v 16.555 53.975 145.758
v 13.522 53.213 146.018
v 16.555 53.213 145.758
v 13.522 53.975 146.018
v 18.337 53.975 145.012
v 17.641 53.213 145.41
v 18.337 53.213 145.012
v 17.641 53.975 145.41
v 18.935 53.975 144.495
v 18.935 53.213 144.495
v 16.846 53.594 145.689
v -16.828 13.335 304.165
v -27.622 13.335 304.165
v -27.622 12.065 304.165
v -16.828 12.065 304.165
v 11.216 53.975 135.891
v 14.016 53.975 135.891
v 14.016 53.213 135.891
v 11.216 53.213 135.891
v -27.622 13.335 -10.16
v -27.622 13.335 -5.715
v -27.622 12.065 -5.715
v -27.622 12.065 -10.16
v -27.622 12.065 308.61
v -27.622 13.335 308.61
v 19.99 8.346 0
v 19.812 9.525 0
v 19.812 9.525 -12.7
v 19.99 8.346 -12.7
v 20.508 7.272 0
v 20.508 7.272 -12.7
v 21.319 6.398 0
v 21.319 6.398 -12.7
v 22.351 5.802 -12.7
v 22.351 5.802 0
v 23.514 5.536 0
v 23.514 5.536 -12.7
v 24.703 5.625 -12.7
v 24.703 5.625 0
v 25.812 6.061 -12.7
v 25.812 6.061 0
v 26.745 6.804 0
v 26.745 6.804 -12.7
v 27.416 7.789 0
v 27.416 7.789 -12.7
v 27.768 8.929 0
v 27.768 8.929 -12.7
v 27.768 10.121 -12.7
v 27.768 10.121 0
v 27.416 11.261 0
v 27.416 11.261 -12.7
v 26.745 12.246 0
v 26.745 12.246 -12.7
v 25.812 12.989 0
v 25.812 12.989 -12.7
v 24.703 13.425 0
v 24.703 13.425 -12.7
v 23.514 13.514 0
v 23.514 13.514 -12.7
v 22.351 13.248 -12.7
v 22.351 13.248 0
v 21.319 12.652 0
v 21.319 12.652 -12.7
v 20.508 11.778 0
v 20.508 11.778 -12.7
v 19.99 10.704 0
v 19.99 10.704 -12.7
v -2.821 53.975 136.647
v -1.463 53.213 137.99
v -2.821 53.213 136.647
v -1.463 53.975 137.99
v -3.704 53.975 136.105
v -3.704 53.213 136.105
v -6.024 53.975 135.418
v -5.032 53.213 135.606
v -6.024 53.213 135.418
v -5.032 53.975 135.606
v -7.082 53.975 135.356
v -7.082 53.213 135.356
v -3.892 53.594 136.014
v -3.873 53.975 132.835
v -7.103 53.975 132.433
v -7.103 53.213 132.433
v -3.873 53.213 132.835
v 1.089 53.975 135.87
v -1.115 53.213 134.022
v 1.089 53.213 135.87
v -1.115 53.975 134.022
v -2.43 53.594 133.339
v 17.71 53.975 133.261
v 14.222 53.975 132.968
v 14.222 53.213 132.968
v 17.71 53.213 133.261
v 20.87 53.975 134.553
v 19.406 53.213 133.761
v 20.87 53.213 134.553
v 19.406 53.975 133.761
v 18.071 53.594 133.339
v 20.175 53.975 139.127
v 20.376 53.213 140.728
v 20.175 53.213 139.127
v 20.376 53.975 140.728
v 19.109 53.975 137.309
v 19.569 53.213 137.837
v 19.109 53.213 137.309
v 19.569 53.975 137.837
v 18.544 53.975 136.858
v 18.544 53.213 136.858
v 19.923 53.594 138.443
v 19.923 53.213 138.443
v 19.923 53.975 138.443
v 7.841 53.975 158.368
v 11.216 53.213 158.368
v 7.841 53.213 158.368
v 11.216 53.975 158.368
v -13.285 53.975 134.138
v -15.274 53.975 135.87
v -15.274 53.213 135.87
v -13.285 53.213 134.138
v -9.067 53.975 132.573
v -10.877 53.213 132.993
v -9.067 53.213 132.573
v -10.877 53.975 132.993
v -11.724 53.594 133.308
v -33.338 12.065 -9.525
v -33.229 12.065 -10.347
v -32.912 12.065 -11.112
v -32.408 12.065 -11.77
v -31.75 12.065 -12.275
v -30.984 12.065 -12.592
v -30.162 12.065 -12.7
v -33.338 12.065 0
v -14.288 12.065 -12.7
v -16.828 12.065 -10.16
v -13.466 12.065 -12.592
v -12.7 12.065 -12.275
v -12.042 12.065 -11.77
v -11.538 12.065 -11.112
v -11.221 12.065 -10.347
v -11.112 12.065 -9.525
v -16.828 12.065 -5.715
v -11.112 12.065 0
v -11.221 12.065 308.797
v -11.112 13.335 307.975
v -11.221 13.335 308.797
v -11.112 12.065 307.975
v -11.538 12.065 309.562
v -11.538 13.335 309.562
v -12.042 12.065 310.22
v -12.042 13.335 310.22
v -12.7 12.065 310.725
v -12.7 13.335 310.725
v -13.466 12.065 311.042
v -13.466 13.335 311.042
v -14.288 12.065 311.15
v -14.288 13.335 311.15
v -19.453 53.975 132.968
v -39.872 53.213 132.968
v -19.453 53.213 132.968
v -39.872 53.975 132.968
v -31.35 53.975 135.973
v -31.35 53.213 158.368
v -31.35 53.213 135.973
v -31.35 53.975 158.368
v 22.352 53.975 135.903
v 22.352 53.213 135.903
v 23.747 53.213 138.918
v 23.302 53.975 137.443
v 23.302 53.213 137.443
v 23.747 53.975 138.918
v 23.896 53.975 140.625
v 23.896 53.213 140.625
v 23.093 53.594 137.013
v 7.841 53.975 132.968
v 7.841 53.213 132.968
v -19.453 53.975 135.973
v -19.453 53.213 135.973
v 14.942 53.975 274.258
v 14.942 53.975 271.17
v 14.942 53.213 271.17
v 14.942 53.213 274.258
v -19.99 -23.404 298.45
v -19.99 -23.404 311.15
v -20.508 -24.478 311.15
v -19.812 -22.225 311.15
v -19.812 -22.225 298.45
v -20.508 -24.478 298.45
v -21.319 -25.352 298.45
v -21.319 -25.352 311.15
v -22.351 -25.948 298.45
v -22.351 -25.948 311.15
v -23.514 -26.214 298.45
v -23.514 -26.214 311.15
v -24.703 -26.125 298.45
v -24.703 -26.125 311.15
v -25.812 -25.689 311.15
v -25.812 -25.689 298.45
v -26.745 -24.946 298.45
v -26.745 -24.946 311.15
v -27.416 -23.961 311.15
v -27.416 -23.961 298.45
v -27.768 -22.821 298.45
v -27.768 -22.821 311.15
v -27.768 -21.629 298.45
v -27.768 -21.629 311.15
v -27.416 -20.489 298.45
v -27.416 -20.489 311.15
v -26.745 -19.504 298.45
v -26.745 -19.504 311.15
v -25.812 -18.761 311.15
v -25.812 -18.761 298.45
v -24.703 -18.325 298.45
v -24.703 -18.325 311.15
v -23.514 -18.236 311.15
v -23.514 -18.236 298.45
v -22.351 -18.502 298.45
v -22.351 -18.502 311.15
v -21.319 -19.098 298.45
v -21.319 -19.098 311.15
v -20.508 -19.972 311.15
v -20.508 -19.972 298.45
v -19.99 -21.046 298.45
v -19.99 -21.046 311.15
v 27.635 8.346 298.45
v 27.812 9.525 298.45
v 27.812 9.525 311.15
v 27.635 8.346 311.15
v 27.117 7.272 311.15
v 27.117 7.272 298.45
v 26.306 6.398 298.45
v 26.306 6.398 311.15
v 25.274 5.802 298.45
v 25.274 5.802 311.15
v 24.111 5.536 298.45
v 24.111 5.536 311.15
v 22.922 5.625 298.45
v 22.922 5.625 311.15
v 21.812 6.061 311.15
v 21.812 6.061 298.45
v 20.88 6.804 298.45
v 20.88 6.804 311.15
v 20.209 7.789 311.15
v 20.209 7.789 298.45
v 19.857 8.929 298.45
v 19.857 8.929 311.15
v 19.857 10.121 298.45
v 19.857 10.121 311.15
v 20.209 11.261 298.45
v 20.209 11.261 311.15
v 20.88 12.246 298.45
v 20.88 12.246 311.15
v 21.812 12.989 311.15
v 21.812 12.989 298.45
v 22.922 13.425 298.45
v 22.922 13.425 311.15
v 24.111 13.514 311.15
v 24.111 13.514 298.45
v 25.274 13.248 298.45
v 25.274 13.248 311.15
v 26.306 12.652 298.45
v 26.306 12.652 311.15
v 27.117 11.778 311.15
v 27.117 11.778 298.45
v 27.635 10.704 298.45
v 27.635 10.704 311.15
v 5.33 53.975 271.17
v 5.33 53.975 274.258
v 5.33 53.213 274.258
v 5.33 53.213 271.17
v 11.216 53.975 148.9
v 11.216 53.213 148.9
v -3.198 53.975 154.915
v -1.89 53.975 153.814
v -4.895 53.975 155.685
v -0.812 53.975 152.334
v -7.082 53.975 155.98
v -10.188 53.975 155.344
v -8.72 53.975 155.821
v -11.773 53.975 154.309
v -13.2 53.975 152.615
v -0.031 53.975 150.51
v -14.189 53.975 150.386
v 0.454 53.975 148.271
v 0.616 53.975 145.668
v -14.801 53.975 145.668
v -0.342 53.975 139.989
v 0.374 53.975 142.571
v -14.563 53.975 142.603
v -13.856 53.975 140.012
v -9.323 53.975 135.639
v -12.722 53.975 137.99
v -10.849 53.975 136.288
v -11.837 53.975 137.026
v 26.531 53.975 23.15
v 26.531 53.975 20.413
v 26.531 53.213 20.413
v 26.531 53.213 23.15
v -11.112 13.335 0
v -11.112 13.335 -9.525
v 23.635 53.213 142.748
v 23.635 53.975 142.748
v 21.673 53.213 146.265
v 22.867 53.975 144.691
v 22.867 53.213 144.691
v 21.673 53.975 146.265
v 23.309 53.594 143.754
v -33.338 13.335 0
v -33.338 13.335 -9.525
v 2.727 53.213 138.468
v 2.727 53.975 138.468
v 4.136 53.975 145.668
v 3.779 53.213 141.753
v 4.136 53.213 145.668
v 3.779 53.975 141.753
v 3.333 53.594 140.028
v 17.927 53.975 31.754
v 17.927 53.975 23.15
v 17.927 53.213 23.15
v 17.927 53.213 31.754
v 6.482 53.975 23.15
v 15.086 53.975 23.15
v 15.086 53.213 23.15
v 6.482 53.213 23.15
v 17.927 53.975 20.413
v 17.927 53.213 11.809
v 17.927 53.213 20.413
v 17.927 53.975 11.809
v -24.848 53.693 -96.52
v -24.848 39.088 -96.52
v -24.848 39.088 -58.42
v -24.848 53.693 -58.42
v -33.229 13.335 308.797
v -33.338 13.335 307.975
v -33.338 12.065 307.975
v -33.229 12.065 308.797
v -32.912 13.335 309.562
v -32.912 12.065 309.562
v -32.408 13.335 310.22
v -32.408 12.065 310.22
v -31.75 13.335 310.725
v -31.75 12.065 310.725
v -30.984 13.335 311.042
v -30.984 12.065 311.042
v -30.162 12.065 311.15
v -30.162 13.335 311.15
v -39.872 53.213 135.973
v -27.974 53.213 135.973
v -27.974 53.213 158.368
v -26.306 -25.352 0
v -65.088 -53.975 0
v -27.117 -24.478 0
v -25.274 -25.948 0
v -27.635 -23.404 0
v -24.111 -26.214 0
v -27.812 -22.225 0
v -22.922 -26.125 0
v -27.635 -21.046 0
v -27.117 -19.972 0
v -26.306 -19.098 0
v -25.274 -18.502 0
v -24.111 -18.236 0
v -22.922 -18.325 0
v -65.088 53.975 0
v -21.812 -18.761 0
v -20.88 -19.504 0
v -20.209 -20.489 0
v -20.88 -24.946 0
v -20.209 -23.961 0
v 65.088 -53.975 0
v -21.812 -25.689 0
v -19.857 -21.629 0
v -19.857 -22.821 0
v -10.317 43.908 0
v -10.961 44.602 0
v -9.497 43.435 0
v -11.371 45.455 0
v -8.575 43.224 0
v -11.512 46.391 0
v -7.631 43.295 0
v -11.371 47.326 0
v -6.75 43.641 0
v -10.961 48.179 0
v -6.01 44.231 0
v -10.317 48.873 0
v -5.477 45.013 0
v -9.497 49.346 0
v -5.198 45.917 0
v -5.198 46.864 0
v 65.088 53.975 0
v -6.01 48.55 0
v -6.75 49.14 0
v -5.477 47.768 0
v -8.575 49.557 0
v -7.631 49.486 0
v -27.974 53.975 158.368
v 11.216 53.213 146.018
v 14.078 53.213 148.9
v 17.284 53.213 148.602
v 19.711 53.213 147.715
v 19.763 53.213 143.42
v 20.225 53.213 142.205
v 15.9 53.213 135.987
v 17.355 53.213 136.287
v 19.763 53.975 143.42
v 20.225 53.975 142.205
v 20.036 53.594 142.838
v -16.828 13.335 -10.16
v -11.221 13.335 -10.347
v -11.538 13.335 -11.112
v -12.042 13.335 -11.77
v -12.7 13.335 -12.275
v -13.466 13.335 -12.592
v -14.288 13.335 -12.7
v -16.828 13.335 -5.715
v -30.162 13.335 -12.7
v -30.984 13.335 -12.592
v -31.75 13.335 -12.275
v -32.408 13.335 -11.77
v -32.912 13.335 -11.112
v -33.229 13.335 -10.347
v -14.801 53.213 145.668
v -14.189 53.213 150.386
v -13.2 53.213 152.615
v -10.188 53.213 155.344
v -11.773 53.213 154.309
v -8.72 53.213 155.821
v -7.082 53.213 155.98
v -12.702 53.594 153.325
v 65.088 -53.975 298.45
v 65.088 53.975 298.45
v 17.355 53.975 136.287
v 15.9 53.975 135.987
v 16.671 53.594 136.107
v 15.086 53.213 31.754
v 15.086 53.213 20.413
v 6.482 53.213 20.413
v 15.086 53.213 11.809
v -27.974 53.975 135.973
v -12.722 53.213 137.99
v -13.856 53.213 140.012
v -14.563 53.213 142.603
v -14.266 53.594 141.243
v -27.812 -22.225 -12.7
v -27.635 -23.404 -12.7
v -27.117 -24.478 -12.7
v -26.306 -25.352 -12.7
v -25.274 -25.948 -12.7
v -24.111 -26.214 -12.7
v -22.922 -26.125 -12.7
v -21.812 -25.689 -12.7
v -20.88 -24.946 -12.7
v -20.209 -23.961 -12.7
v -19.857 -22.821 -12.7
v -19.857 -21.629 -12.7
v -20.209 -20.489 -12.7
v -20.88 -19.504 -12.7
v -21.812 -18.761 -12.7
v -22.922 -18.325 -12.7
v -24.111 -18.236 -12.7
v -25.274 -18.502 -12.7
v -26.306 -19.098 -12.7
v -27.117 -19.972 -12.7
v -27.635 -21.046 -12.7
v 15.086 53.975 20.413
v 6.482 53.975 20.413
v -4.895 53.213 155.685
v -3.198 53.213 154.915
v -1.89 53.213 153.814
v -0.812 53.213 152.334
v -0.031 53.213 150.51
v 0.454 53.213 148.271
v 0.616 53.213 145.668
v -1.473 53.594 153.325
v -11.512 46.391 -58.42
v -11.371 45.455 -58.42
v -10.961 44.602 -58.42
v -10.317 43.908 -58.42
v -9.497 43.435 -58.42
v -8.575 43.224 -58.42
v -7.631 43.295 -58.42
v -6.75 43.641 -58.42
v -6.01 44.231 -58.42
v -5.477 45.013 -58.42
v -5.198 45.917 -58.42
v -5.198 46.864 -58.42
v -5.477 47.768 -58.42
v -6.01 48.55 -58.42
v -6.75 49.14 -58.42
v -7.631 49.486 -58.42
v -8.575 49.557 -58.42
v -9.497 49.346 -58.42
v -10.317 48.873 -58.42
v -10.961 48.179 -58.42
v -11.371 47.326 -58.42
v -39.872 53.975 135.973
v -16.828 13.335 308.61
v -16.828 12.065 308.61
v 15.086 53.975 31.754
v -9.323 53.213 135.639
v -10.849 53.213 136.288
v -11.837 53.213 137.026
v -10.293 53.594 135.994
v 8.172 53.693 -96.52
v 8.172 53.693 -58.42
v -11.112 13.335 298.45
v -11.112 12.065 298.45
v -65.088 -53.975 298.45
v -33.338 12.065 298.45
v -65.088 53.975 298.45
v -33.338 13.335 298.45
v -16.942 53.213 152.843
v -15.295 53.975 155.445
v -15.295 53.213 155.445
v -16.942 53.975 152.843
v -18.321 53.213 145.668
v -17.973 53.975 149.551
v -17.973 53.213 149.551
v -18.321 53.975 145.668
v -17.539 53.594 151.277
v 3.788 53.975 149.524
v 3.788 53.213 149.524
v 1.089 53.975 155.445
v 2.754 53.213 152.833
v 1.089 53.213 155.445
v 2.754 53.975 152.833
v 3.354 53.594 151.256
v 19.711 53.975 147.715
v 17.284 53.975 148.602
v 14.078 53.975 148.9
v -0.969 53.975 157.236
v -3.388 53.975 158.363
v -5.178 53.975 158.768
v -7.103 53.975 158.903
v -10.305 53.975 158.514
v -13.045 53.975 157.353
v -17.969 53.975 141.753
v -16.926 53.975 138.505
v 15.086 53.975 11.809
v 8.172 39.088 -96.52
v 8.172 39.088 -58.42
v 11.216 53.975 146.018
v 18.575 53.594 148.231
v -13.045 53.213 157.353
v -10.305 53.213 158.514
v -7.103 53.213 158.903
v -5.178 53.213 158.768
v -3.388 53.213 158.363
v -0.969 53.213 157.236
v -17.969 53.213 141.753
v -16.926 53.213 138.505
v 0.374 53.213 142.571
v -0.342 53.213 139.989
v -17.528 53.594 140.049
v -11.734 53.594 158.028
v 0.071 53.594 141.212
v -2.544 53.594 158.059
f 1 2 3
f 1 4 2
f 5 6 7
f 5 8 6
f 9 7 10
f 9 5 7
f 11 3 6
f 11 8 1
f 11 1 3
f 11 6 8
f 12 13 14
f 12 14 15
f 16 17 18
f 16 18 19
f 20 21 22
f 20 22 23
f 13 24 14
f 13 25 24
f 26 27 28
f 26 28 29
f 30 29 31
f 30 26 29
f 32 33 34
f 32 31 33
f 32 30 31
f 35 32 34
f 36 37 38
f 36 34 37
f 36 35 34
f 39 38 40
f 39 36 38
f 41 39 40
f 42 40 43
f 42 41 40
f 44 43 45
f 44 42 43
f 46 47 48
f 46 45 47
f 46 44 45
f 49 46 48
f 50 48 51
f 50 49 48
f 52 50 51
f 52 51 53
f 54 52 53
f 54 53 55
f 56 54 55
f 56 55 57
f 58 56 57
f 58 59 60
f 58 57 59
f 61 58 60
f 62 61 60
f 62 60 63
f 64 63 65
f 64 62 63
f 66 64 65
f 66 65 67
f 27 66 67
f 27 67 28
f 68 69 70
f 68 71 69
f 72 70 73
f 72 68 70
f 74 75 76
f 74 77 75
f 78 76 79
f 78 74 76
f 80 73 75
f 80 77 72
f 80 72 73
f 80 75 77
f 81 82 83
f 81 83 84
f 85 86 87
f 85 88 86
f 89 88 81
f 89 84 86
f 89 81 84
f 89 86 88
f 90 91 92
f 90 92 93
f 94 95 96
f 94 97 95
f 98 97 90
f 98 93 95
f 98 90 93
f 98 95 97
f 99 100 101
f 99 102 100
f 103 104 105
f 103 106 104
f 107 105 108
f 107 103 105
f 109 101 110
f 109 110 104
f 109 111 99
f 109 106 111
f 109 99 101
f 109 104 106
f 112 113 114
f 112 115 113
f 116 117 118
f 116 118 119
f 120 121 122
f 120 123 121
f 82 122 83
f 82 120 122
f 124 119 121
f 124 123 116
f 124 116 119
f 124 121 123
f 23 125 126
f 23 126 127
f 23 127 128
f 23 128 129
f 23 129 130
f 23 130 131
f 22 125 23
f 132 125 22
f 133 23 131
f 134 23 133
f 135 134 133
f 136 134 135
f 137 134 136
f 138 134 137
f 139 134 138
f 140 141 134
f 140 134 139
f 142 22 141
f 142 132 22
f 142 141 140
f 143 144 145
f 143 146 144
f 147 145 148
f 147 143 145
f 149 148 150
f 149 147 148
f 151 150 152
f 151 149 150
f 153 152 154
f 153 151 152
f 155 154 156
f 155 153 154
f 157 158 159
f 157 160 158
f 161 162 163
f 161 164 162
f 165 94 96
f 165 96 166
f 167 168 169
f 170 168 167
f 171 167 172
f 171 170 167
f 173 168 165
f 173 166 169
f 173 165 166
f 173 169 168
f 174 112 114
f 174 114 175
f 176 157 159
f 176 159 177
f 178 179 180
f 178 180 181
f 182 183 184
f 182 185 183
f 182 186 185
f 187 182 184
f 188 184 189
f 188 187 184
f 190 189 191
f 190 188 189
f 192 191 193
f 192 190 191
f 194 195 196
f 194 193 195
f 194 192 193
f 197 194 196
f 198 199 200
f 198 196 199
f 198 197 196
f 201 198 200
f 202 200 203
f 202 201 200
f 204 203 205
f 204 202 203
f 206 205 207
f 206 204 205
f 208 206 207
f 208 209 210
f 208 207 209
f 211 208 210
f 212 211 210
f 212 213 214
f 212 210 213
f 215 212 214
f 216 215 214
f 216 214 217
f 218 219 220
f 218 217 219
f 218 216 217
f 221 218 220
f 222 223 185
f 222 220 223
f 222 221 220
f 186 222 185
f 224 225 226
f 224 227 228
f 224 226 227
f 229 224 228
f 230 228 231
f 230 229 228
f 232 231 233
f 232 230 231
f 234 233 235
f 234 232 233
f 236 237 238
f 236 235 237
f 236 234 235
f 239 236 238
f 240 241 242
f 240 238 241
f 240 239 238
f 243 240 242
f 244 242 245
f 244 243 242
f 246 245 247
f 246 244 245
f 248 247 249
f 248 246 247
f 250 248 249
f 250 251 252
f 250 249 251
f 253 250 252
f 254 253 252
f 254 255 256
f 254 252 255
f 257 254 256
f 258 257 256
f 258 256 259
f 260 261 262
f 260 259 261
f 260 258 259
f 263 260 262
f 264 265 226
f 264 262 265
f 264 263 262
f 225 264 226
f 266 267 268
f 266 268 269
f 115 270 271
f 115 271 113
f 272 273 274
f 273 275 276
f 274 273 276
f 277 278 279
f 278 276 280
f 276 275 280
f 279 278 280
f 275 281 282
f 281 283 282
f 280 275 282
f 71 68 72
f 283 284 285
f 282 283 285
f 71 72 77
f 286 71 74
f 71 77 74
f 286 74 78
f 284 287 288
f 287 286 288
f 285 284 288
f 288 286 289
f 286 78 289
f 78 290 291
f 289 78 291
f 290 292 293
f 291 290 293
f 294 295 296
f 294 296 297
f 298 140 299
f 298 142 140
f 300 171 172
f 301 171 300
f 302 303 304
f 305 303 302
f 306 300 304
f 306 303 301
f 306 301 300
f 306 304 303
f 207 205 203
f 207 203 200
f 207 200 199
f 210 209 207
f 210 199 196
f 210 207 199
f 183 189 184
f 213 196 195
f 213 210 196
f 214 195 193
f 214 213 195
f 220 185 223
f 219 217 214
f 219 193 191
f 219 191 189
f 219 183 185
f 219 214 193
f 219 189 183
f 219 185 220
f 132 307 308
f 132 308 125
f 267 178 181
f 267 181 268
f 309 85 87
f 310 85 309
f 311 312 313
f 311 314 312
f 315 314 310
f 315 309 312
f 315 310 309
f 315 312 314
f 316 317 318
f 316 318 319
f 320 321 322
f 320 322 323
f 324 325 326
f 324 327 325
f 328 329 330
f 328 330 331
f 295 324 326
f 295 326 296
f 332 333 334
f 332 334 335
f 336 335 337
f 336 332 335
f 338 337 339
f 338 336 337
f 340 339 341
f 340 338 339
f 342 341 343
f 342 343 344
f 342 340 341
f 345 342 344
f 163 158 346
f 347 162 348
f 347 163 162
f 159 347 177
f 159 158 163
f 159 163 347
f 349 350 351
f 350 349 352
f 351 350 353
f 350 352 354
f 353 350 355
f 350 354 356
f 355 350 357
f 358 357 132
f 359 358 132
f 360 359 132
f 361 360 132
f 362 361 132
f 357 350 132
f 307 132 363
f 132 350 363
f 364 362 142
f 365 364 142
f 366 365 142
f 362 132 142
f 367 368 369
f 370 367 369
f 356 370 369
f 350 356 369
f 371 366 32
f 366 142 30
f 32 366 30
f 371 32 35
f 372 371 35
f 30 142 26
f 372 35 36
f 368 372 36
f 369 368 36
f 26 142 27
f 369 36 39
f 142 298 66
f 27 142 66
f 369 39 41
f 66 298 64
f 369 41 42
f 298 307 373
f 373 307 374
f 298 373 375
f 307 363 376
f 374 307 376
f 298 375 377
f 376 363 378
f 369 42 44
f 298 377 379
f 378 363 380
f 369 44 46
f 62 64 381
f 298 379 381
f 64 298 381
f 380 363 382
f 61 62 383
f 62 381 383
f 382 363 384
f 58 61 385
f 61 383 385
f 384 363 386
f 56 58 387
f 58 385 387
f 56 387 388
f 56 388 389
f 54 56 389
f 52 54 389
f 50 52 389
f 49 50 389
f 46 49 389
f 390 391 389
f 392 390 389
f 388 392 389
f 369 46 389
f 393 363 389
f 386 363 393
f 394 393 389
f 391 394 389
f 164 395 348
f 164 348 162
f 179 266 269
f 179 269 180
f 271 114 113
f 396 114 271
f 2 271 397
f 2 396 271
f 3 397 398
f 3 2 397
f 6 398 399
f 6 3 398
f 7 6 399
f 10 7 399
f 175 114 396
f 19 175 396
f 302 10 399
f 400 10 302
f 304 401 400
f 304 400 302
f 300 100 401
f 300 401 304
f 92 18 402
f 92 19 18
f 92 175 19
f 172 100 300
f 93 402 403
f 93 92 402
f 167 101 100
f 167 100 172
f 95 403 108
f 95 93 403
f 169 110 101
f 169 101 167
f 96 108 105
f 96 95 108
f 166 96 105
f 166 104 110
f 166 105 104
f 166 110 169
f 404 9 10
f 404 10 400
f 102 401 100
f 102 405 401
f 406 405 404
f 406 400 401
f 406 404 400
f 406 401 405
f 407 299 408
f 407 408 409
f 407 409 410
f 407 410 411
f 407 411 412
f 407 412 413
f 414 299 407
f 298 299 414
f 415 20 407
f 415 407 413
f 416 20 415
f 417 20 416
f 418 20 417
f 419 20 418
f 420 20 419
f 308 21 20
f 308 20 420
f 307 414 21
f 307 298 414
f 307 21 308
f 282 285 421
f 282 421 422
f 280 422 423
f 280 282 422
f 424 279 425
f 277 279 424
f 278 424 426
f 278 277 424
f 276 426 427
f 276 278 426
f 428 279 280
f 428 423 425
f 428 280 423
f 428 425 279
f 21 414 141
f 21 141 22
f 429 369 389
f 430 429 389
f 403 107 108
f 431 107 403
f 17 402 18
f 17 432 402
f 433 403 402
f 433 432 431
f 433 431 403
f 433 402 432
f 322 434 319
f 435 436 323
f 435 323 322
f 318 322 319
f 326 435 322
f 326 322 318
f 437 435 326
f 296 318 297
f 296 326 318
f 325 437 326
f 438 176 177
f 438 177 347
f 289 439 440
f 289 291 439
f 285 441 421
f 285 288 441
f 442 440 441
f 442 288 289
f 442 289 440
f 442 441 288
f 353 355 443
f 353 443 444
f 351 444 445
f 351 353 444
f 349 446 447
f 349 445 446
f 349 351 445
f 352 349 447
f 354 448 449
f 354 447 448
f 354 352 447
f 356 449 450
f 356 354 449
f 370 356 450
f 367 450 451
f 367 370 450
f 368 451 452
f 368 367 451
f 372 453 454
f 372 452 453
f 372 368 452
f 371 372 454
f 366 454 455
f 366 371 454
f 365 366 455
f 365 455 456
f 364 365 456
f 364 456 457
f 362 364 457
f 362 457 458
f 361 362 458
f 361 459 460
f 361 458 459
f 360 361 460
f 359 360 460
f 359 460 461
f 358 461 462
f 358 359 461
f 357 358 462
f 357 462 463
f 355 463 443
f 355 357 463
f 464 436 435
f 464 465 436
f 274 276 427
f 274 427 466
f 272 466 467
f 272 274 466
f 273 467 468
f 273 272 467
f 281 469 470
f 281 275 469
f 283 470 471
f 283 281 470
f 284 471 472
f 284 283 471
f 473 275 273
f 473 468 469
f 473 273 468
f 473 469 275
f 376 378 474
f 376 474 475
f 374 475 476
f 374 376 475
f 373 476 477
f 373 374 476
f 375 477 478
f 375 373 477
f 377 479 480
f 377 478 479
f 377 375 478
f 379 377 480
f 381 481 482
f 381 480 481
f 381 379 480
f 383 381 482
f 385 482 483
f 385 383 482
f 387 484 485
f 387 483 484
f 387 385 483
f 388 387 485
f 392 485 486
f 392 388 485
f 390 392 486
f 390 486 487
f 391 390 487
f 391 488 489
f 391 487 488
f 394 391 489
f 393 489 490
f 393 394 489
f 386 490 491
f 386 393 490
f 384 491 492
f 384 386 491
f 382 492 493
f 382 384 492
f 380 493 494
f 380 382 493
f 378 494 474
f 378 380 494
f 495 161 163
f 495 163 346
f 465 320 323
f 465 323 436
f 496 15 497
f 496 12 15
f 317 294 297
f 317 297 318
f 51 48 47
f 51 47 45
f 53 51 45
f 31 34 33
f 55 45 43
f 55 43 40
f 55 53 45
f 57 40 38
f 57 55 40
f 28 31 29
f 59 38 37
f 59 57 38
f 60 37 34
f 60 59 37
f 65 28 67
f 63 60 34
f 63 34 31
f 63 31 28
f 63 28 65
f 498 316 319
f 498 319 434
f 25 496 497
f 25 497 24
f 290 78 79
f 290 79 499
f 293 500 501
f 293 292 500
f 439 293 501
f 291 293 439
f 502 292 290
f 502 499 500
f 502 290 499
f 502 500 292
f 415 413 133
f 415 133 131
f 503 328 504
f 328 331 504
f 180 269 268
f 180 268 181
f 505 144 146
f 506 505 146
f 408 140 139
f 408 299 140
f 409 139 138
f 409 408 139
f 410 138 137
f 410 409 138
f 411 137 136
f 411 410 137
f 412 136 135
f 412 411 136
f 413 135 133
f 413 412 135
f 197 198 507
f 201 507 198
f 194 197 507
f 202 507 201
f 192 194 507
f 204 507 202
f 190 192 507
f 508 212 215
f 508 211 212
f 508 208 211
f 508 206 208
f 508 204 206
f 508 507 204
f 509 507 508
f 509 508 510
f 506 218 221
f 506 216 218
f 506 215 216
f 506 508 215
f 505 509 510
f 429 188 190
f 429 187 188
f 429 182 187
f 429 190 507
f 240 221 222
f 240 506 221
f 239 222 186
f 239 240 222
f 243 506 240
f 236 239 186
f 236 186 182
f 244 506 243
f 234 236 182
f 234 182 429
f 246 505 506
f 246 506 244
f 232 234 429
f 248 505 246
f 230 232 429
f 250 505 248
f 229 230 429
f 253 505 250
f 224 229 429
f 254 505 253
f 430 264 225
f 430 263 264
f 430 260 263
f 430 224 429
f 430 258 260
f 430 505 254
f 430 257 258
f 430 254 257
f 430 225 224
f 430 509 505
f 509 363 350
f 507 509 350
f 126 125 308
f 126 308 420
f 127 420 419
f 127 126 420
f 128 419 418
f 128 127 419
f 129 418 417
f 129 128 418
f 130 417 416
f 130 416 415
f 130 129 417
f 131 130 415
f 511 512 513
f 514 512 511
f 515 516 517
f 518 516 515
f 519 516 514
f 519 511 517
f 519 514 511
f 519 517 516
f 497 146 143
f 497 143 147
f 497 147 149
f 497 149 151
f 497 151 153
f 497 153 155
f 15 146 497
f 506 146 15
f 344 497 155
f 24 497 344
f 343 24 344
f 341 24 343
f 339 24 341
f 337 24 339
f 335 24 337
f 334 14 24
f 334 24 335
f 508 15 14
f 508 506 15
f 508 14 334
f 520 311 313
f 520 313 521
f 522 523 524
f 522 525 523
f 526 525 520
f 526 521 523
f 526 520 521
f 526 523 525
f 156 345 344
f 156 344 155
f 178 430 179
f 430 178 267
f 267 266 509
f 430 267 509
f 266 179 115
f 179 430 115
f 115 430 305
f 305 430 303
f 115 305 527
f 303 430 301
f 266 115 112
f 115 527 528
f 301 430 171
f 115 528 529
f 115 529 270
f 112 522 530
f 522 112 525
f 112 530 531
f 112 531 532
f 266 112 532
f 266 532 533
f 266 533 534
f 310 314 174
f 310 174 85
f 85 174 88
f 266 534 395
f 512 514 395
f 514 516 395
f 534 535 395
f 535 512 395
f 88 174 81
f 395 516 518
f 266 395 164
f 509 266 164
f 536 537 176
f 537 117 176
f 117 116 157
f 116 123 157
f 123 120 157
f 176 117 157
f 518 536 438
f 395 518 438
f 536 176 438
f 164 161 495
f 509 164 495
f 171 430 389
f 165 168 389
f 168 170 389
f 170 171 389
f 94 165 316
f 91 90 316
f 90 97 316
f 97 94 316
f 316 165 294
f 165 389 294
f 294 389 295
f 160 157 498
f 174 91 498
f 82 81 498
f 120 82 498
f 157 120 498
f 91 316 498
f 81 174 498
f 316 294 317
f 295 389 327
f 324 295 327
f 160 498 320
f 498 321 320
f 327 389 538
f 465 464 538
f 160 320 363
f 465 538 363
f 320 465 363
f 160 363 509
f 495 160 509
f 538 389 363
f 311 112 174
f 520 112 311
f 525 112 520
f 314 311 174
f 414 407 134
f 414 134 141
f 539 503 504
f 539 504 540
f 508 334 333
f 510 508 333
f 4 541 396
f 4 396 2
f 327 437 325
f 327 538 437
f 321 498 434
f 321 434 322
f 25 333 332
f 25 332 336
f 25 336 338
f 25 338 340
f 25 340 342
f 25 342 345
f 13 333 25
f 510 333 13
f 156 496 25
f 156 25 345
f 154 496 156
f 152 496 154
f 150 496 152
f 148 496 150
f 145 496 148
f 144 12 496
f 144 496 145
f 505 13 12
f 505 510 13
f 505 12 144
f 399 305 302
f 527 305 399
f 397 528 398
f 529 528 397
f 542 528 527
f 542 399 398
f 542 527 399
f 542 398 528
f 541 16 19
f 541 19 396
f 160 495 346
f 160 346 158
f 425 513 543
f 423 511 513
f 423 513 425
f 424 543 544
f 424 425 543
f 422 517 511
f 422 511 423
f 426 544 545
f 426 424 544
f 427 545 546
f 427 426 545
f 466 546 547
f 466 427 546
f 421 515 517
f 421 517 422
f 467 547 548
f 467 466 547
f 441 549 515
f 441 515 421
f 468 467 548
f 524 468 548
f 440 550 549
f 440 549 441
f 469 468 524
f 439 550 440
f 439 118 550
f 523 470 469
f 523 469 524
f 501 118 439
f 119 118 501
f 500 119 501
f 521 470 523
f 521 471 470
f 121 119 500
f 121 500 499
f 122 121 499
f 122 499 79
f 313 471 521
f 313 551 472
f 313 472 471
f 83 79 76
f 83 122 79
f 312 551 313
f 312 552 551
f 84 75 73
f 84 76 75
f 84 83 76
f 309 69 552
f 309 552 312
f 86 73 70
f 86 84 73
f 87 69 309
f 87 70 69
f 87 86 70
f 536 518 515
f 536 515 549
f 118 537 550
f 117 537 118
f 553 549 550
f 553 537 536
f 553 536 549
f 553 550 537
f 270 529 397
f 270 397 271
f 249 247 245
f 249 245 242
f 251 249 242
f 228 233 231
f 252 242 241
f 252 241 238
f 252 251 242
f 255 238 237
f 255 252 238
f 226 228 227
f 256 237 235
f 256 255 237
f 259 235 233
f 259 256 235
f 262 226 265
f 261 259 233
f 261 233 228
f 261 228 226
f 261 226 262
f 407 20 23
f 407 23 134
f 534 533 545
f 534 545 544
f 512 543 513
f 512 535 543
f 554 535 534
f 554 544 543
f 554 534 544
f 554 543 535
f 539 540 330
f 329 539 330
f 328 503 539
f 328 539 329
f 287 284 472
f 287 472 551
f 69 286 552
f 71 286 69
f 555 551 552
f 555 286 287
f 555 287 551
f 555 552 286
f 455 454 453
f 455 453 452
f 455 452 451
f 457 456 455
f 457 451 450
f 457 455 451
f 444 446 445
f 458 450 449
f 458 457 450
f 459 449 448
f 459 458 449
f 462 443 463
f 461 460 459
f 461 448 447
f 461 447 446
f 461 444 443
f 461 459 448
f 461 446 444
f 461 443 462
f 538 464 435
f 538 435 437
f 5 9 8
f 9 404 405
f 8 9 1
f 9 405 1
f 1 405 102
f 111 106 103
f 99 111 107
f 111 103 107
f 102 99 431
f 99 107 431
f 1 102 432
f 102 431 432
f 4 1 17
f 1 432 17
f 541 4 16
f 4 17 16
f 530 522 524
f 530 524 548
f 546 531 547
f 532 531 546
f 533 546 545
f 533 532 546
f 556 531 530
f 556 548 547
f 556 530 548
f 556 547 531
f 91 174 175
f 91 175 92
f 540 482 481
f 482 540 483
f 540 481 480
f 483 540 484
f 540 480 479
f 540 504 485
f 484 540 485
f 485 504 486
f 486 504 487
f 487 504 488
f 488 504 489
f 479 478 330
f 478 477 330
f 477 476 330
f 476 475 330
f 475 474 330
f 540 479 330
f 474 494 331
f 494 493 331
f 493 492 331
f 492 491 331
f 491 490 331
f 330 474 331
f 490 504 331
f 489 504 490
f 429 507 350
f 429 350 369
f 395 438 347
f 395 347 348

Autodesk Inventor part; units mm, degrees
ref_plane "YZ Plane" through (0, 0, 0) normal (1, 0, 0) x (0, 1, 0)
ref_plane "XZ Plane" through (0, 0, 0) normal (0, 1, 0) x (-1, 0, 0)
ref_plane "XY Plane" through (0, 0, 0) normal (0, 0, 1) x (1, 0, 0)
sketch "Sketch1" plane through (0, 0, 0) normal (0, 0, 1) x (1, 0, 0)
  line L0 (-65.0875, -53.975) -> (65.0875, -53.975)
  line L1 (65.0875, -53.975) -> (65.0875, 53.975)
  line L2 (65.0875, 53.975) -> (-65.0875, 53.975)
  line L3 (-65.0875, 53.975) -> (-65.0875, -53.975)
  line L4 (-65.0875, -53.975) -> (65.0875, 53.975) construction
  line L5 (65.0875, -53.975) -> (-65.0875, 53.975) construction
  point P0 (0, 0)
  dimension "d0" = 130.175
  dimension "d1" = 107.95
extrude "Extrusion1" add sketch "Sketch1" along normal blind 298.45
sketch "Sketch2" plane through (0, 0, 298.45) normal (0, 0, 1) x (1, 0, 0)
  line L0 (-65.0875, -53.975) -> (65.0875, -53.975) construction
  line L1 (-65.0875, 53.975) -> (-65.0875, -53.975) construction
  circle A0 centre (-23.8125, -22.225) radius 4
  circle A1 centre (23.8125, 9.525) radius 4
  line L2 (-11.1125, 12.065) -> (-33.3375, 12.065)
  line L3 (-33.3375, 12.065) -> (-33.3375, 13.335)
  line L4 (-33.3375, 13.335) -> (-11.1125, 13.335)
  line L5 (-11.1125, 13.335) -> (-11.1125, 12.065)
  line L6 (-33.3375, 12.7) -> (-65.0875, 12.7) construction
  point P0 (0, 0)
  dimension "d4" = 31.75
  dimension "d5" = 41.275
  dimension "d6" = 8
  dimension "d7" = 63.5
  dimension "d8" = 88.9
  dimension "d13" = 31.75
  dimension "d14" = 53.975
  dimension "d15" = 66.675
  dimension "d16" = 1.27
extrude "Extrusion2" add sketch "Sketch2" along normal blind 12.7
sketch "Sketch3" plane through (0, 0, 0) normal (0, 0, -1) x (-1, 0, 0)
  circle A0 centre (-23.8125, 9.525) radius 4 projected
  circle A1 centre (23.8125, -22.225) radius 4 projected
  line L0 (33.3375, 12.065) -> (11.1125, 12.065) projected
  line L1 (11.1125, 12.065) -> (11.1125, 13.335) projected
  line L2 (11.1125, 13.335) -> (33.3375, 13.335) projected
  line L3 (33.3375, 13.335) -> (33.3375, 12.065) projected
  point P0 (0, 0)
extrude "Extrusion3" add sketch "Sketch3" along normal blind 12.7
sketch "Sketch4" plane through (-33.3375, 13.335, 0) normal (0, 1, 0) x (1, 0, 0)
  line L0 (0, 12.7) -> (22.225, 12.7) projected
  line L1 (22.225, 0) -> (22.225, 12.7) projected
  line L2 (0, 0) -> (0, 12.7) projected
  line L3 (22.225, -298.45) -> (22.225, -311.15) projected
  line L4 (22.225, -311.15) -> (0, -311.15) projected
  line L5 (0, -298.45) -> (0, -311.15) projected
  line L6 (16.51, -308.61) -> (5.715, -308.61)
  line L7 (5.715, -308.61) -> (5.715, -304.165)
  line L8 (5.715, -304.165) -> (16.51, -304.165)
  line L9 (16.51, -304.165) -> (16.51, -308.61)
  line L10 (16.51, 5.715) -> (5.715, 5.715)
  line L11 (5.715, 5.715) -> (5.715, 10.16)
  line L12 (5.715, 10.16) -> (16.51, 10.16)
  line L13 (16.51, 10.16) -> (16.51, 5.715)
  line L14 (5.715, 10.16) -> (0, 12.7) construction
  line L15 (16.51, 10.16) -> (22.225, 12.7) construction
  line L16 (22.225, -311.15) -> (16.51, -308.61) construction
  line L17 (5.715, -308.61) -> (0, -311.15) construction
  point P0 (33.3375, 0)
  dimension "d17" = 10.795
  dimension "d18" = 6.985
  dimension "d19" = 2.54
extrude "Extrusion4" cut sketch "Sketch4" against normal up to surface (1.27 mm away)
fillet "Fillet1" radius 3.175 4 edges at (-33.3375, 12.7, -12.7) (-11.1125, 12.7, -12.7) (-33.3375, 12.7, 311.15) (-11.1125, 12.7, 311.15)
thread "Thread1" size "M8x1.25" class "6g" standard "ANSI Metric M Profile" full length
thread "Thread2" size "M8x1.25" class "6g" standard "ANSI Metric M Profile" full length
thread "Thread3" size "M8x1.25" class "6g" standard "ANSI Metric M Profile" full length
thread "Thread4" size "M8x1.25" class "6g" standard "ANSI Metric M Profile" full length
sketch "Sketch5" plane through (-65.0875, 53.975, 0) normal (0, 1, 0) x (1, 0, 0)
  line L0 (25.2364, -11.8087) -> (114.825, -11.8087) construction
  line L1 (114.825, -11.8087) -> (114.825, -199.7093) construction
  line L2 (114.825, -199.7093) -> (25.2364, -199.7093) construction
  line L3 (25.2364, -199.7093) -> (25.2364, -11.8087) construction
  line L4 (91.6181, -23.1502) -> (83.0142, -23.1502)
  line L5 (83.0142, -23.1502) -> (83.0142, -31.7541)
  line L6 (83.0142, -31.7541) -> (80.1737, -31.7541)
  line L7 (80.1737, -31.7541) -> (80.1737, -23.1502)
  line L8 (80.1737, -23.1502) -> (71.5698, -23.1502)
  line L9 (71.5698, -23.1502) -> (71.5698, -20.4126)
  line L10 (71.5698, -20.4126) -> (80.1737, -20.4126)
  line L11 (80.1737, -20.4126) -> (80.1737, -11.8087)
  line L12 (80.1737, -11.8087) -> (83.0142, -11.8087)
  line L13 (83.0142, -11.8087) -> (83.0142, -20.4126)
  line L14 (83.0142, -20.4126) -> (91.6181, -20.4126)
  line L15 (91.6181, -20.4126) -> (91.6181, -23.1502)
  line L16 (33.7374, -158.3681) -> (33.7374, -135.9732)
  line L17 (33.7374, -135.9732) -> (25.2158, -135.9732)
  line L18 (25.2158, -135.9732) -> (25.2158, -132.9681)
  line L19 (25.2158, -132.9681) -> (45.6346, -132.9681)
  line L20 (45.6346, -132.9681) -> (45.6346, -135.9732)
  line L21 (45.6346, -135.9732) -> (37.1131, -135.9732)
  line L22 (37.1131, -135.9732) -> (37.1131, -158.3681)
  line L23 (37.1131, -158.3681) -> (33.7374, -158.3681)
  spline S0 degree 2 poles (66.1769, -135.8703) (67.6178, -137.5582) (69.2233, -142.4982) (69.2233, -145.6681) knots 0 0 0 1 2 2 2
  spline S1 degree 2 poles (69.2233, -145.6681) (69.2233, -148.7556) (67.6589, -153.7574) (66.1769, -155.4452) knots 0 0 0 1 2 2 2
  spline S2 degree 2 poles (66.1769, -155.4452) (64.6126, -157.2154) (60.4753, -158.9032) (57.9847, -158.9032) knots 0 0 0 1 2 2 2
  spline S3 degree 2 poles (57.9847, -158.9032) (55.4118, -158.9032) (51.2951, -157.1536) (49.7925, -155.4452) knots 0 0 0 1 2 2 2
  spline S4 degree 2 poles (49.7925, -155.4452) (48.3311, -153.7574) (46.7667, -148.7967) (46.7667, -145.6681) knots 0 0 0 1 2 2 2
  spline S5 degree 2 poles (46.7667, -145.6681) (46.7667, -142.4776) (48.3516, -137.6199) (49.8131, -135.8703) knots 0 0 0 1 2 2 2
  spline S6 degree 2 poles (49.8131, -135.8703) (51.2951, -134.1825) (55.4324, -132.4329) (57.9847, -132.4329) knots 0 0 0 1 2 2 2
  spline S7 degree 2 poles (57.9847, -132.4329) (60.5782, -132.4329) (64.7361, -134.2442) (66.1769, -135.8703) knots 0 0 0 1 2 2 2
  spline S8 degree 2 poles (65.7035, -145.6681) (65.7035, -143.1569) (64.6126, -139.2666) (63.6246, -137.9904) knots 0 0 0 1 2 2 2
  spline S9 degree 2 poles (63.6246, -137.9904) (62.616, -136.6731) (59.7755, -135.3557) (58.0053, -135.3557) knots 0 0 0 1 2 2 2
  spline S10 degree 2 poles (58.0053, -135.3557) (56.1734, -135.3557) (53.4152, -136.6319) (52.3654, -137.9904) knots 0 0 0 1 2 2 2
  spline S11 degree 2 poles (52.3654, -137.9904) (51.3568, -139.2872) (50.2865, -143.198) (50.2865, -145.6681) knots 0 0 0 1 2 2 2
  spline S12 degree 2 poles (50.2865, -145.6681) (50.2865, -150.6698) (54.4855, -155.9804) (58.0053, -155.9804) knots 0 0 0 1 2 2 2
  spline S13 degree 2 poles (58.0053, -155.9804) (61.5251, -155.9804) (65.7035, -150.6698) (65.7035, -145.6681) knots 0 0 0 1 2 2 2
  spline S14 degree 2 poles (88.9834, -140.6251) (88.9834, -142.2718) (87.8102, -145.2358) (86.7604, -146.265) knots 0 0 0 1 2 2 2
  spline S15 degree 2 poles (86.7604, -146.265) (85.4431, -147.5617) (81.8821, -148.8997) (79.1651, -148.8997) knots 0 0 0 1 2 2 2
  line L24 (79.1651, -148.8997) -> (76.304, -148.8997)
  line L25 (76.304, -148.8997) -> (76.304, -158.3681)
  line L26 (76.304, -158.3681) -> (72.9283, -158.3681)
  line L27 (72.9283, -158.3681) -> (72.9283, -132.9681)
  line L28 (72.9283, -132.9681) -> (79.3092, -132.9681)
  spline S16 degree 2 poles (79.3092, -132.9681) (81.5734, -132.9681) (84.7432, -133.7091) (85.9576, -134.553) knots 0 0 0 1 2 2 2
  spline S17 degree 2 poles (85.9576, -134.553) (87.3779, -135.5204) (88.9834, -138.505) (88.9834, -140.6251) knots 0 0 0 1 2 2 2
  spline S18 degree 2 poles (85.4636, -140.728) (85.4636, -139.4107) (84.558, -137.4758) (83.6317, -136.8583) knots 0 0 0 1 2 2 2
  spline S19 degree 2 poles (83.6317, -136.8583) (82.829, -136.3232) (80.6883, -135.8909) (79.1034, -135.8909) knots 0 0 0 1 2 2 2
  line L29 (79.1034, -135.8909) -> (76.304, -135.8909)
  line L30 (76.304, -135.8909) -> (76.304, -146.018)
  line L31 (76.304, -146.018) -> (78.6093, -146.018)
  spline S20 degree 2 poles (78.6093, -146.018) (80.6677, -146.018) (83.1995, -145.3593) (84.0228, -144.4948) knots 0 0 0 1 2 2 2
  spline S21 degree 2 poles (84.0228, -144.4948) (84.7844, -143.7332) (85.4636, -141.9424) (85.4636, -140.728) knots 0 0 0 1 2 2 2
  line L32 (80.0296, -274.258) -> (70.4171, -274.258)
  line L33 (70.4171, -274.258) -> (70.4171, -271.1705)
  line L34 (70.4171, -271.1705) -> (80.0296, -271.1705)
  line L35 (80.0296, -271.1705) -> (80.0296, -274.258)
  point P0 (65.0875, 0)
extrude "Extrusion7" cut sketch "Sketch5" against normal blind 0.762
sketch "Sketch6" plane through (0, 0, 0) normal (0, 0, -1) x (-1, 0, 0)
  circle A0 centre (8.3375, 46.3906) radius 3.175
  point P0 (0, 0)
  dimension "d31" = 6.35
extrude "Extrusion5" add sketch "Sketch6" along normal blind 58.42
sketch "Sketch7" plane through (-8.3375, 46.3906, -58.42) normal (0, 0, -1) x (-1, 0, 0)
  circle A0 centre (0, 0) radius 3.175 projected
  line L0 (-16.51, -7.3025) -> (16.51, -7.3025)
  line L1 (16.51, -7.3025) -> (16.51, 7.3025)
  line L2 (16.51, 7.3025) -> (-16.51, 7.3025)
  line L3 (-16.51, 7.3025) -> (-16.51, -7.3025)
  line L4 (-16.51, -7.3025) -> (16.51, 7.3025) construction
  line L5 (16.51, -7.3025) -> (-16.51, 7.3025) construction
  point P0 (-8.3375, -46.3906)
  dimension "d34" = 14.605
  dimension "d35" = 33.02
extrude "Extrusion6" add sketch "Sketch7" along normal blind 38.1 contours A0 | L3 L2 L1 L0
properties part number "12S Module"
